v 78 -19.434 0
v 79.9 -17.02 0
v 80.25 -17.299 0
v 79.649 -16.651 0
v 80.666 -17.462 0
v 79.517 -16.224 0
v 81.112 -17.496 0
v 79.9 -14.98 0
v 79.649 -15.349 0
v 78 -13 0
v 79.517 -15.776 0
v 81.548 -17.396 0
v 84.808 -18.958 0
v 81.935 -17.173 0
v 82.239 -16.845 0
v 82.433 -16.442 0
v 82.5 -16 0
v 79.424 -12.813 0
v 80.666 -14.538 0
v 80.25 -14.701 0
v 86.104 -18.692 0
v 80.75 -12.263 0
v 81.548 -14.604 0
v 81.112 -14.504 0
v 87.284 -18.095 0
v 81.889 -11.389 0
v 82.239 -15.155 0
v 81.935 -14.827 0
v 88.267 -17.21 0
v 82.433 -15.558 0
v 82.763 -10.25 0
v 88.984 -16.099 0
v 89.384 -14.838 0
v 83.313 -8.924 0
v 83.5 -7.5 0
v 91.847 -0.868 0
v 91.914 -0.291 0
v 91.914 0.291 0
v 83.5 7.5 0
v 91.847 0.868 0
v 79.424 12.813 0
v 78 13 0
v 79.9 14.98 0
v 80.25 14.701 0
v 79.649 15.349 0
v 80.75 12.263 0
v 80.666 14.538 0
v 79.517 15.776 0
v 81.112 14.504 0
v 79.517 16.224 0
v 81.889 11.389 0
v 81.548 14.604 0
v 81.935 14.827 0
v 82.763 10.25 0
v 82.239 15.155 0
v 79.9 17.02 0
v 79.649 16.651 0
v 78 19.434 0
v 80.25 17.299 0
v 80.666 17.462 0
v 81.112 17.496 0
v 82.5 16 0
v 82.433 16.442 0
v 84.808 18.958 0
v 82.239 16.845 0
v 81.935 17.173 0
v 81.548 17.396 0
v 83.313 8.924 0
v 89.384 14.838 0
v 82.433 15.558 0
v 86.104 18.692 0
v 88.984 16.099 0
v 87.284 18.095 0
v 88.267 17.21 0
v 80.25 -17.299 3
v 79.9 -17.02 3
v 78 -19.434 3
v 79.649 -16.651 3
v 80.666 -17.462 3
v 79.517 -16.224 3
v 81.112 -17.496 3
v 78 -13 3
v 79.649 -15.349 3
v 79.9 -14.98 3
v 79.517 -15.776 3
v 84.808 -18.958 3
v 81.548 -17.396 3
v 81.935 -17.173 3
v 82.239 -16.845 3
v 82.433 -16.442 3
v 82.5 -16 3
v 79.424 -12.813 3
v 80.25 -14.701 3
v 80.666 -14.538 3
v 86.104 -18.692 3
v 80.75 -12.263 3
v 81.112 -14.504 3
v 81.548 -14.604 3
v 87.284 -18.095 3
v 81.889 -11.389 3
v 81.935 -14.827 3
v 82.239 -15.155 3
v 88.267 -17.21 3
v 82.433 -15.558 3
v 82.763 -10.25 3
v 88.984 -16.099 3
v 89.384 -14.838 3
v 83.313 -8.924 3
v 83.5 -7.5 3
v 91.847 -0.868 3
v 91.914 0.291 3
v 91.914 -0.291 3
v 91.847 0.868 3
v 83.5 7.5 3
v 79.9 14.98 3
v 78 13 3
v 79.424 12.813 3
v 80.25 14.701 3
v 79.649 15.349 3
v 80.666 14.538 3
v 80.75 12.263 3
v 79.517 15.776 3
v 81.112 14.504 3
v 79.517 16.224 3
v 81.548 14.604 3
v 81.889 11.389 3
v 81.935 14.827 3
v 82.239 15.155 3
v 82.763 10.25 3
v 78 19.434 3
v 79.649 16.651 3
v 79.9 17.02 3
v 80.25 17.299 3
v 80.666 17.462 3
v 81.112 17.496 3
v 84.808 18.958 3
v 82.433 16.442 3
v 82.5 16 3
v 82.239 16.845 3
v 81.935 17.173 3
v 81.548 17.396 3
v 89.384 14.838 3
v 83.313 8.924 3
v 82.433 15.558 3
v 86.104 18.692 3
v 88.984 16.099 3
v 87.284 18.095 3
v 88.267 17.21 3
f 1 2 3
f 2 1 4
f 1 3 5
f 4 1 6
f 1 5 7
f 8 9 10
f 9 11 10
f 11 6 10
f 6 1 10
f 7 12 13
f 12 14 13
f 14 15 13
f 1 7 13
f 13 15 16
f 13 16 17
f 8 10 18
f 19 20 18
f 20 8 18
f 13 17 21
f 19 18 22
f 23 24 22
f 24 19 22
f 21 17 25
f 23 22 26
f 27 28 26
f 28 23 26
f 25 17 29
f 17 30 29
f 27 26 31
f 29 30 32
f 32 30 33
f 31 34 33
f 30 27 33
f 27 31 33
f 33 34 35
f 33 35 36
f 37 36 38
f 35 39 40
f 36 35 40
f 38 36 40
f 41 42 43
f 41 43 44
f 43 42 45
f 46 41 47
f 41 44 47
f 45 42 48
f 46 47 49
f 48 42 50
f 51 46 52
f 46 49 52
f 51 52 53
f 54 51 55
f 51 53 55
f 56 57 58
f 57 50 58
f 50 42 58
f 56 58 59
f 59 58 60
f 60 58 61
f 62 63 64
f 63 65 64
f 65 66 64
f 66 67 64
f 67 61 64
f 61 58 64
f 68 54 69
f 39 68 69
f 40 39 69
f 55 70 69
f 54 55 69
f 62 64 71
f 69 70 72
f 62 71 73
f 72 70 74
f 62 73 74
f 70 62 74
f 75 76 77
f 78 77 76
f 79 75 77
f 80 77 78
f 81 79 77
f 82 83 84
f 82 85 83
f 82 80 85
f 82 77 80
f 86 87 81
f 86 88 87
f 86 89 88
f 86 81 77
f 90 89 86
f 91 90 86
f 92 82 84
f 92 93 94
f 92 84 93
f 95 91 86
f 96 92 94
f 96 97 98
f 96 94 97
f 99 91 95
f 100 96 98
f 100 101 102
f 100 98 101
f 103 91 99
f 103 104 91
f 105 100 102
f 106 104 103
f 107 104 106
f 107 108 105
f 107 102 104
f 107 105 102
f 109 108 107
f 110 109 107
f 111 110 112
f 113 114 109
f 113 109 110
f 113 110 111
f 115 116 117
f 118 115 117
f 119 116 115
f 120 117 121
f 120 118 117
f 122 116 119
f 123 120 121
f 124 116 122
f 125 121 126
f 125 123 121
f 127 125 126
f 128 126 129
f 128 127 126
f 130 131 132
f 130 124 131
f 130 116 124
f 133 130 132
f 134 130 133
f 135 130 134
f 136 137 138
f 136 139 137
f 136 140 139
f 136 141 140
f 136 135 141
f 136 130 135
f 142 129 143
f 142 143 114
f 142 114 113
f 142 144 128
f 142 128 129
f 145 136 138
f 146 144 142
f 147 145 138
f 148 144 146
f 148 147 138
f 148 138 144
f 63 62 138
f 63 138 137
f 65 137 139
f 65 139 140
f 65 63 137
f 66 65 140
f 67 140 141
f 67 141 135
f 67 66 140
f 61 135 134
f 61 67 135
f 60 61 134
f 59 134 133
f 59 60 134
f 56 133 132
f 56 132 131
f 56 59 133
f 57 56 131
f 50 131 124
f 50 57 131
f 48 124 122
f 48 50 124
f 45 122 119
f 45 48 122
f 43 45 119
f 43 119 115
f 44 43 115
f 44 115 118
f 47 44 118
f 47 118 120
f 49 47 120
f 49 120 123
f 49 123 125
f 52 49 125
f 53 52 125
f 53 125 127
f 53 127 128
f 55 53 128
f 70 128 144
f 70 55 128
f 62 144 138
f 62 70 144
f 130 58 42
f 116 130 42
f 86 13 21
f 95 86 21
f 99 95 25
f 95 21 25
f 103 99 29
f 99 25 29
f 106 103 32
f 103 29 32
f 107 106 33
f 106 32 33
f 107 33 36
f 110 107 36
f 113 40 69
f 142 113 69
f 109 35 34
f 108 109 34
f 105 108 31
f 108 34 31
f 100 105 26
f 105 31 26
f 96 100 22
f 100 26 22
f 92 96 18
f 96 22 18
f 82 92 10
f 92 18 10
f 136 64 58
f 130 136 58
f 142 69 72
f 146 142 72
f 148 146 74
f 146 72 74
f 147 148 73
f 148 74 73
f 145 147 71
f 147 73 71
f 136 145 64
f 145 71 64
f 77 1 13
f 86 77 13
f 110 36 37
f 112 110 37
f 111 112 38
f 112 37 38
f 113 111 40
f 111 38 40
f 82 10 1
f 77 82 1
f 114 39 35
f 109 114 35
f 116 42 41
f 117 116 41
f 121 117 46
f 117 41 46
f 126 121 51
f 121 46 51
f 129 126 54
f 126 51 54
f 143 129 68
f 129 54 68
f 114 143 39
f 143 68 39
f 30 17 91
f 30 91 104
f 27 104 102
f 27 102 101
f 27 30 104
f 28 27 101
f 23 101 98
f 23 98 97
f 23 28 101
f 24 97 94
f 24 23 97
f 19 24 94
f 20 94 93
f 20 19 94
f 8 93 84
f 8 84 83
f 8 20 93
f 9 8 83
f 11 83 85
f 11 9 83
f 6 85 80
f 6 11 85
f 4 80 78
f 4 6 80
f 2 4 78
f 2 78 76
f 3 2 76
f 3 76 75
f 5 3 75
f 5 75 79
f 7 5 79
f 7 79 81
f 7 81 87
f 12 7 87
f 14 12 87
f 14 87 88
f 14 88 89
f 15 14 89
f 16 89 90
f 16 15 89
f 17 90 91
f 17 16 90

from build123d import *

# Parameters (mm, degrees)
SKETCH1_R           = 1.5
BOSS_EXTRUDE1_DEPTH = 3


with BuildPart() as part:
    # Sketch1 → Boss-Extrude1 (new body)
    with BuildSketch(Plane.XY):
        with BuildLine():
            Line((84.808392572, 18.957643404), (78, 19.433732591))
            Line((78, 19.433732591), (78, 13))
            ThreePointArc((78, 13), (81.889087297, 11.389087297), (83.5, 7.5))
            Line((83.5, 7.5), (83.5, -7.5))
            ThreePointArc((83.5, -7.5), (81.889087297, -11.389087297), (78, -13))
            Line((78, -13), (78, -19.433732591))
            Line((78, -19.433732591), (84.808392572, -18.957643404))
            ThreePointArc((84.808392572, -18.957643404), (87.805263235, -17.68554728), (89.383648968, -14.838064041))
            Line((89.383648968, -14.838064041), (91.846905706, -0.868240888))
            ThreePointArc((91.846905706, -0.868240888), (91.922866941, 0), (91.846905706, 0.868240888))
            Line((91.846905706, 0.868240888), (89.383648968, 14.838064041))
            ThreePointArc((89.383648968, 14.838064041), (87.805263235, 17.68554728), (84.808392572, 18.957643404))
        make_face()
        with Locations((81, -16)):
            Circle(SKETCH1_R, mode=Mode.SUBTRACT)
        with Locations((81, 16)):
            Circle(SKETCH1_R, mode=Mode.SUBTRACT)
    extrude(amount=BOSS_EXTRUDE1_DEPTH)


solid = part.part
